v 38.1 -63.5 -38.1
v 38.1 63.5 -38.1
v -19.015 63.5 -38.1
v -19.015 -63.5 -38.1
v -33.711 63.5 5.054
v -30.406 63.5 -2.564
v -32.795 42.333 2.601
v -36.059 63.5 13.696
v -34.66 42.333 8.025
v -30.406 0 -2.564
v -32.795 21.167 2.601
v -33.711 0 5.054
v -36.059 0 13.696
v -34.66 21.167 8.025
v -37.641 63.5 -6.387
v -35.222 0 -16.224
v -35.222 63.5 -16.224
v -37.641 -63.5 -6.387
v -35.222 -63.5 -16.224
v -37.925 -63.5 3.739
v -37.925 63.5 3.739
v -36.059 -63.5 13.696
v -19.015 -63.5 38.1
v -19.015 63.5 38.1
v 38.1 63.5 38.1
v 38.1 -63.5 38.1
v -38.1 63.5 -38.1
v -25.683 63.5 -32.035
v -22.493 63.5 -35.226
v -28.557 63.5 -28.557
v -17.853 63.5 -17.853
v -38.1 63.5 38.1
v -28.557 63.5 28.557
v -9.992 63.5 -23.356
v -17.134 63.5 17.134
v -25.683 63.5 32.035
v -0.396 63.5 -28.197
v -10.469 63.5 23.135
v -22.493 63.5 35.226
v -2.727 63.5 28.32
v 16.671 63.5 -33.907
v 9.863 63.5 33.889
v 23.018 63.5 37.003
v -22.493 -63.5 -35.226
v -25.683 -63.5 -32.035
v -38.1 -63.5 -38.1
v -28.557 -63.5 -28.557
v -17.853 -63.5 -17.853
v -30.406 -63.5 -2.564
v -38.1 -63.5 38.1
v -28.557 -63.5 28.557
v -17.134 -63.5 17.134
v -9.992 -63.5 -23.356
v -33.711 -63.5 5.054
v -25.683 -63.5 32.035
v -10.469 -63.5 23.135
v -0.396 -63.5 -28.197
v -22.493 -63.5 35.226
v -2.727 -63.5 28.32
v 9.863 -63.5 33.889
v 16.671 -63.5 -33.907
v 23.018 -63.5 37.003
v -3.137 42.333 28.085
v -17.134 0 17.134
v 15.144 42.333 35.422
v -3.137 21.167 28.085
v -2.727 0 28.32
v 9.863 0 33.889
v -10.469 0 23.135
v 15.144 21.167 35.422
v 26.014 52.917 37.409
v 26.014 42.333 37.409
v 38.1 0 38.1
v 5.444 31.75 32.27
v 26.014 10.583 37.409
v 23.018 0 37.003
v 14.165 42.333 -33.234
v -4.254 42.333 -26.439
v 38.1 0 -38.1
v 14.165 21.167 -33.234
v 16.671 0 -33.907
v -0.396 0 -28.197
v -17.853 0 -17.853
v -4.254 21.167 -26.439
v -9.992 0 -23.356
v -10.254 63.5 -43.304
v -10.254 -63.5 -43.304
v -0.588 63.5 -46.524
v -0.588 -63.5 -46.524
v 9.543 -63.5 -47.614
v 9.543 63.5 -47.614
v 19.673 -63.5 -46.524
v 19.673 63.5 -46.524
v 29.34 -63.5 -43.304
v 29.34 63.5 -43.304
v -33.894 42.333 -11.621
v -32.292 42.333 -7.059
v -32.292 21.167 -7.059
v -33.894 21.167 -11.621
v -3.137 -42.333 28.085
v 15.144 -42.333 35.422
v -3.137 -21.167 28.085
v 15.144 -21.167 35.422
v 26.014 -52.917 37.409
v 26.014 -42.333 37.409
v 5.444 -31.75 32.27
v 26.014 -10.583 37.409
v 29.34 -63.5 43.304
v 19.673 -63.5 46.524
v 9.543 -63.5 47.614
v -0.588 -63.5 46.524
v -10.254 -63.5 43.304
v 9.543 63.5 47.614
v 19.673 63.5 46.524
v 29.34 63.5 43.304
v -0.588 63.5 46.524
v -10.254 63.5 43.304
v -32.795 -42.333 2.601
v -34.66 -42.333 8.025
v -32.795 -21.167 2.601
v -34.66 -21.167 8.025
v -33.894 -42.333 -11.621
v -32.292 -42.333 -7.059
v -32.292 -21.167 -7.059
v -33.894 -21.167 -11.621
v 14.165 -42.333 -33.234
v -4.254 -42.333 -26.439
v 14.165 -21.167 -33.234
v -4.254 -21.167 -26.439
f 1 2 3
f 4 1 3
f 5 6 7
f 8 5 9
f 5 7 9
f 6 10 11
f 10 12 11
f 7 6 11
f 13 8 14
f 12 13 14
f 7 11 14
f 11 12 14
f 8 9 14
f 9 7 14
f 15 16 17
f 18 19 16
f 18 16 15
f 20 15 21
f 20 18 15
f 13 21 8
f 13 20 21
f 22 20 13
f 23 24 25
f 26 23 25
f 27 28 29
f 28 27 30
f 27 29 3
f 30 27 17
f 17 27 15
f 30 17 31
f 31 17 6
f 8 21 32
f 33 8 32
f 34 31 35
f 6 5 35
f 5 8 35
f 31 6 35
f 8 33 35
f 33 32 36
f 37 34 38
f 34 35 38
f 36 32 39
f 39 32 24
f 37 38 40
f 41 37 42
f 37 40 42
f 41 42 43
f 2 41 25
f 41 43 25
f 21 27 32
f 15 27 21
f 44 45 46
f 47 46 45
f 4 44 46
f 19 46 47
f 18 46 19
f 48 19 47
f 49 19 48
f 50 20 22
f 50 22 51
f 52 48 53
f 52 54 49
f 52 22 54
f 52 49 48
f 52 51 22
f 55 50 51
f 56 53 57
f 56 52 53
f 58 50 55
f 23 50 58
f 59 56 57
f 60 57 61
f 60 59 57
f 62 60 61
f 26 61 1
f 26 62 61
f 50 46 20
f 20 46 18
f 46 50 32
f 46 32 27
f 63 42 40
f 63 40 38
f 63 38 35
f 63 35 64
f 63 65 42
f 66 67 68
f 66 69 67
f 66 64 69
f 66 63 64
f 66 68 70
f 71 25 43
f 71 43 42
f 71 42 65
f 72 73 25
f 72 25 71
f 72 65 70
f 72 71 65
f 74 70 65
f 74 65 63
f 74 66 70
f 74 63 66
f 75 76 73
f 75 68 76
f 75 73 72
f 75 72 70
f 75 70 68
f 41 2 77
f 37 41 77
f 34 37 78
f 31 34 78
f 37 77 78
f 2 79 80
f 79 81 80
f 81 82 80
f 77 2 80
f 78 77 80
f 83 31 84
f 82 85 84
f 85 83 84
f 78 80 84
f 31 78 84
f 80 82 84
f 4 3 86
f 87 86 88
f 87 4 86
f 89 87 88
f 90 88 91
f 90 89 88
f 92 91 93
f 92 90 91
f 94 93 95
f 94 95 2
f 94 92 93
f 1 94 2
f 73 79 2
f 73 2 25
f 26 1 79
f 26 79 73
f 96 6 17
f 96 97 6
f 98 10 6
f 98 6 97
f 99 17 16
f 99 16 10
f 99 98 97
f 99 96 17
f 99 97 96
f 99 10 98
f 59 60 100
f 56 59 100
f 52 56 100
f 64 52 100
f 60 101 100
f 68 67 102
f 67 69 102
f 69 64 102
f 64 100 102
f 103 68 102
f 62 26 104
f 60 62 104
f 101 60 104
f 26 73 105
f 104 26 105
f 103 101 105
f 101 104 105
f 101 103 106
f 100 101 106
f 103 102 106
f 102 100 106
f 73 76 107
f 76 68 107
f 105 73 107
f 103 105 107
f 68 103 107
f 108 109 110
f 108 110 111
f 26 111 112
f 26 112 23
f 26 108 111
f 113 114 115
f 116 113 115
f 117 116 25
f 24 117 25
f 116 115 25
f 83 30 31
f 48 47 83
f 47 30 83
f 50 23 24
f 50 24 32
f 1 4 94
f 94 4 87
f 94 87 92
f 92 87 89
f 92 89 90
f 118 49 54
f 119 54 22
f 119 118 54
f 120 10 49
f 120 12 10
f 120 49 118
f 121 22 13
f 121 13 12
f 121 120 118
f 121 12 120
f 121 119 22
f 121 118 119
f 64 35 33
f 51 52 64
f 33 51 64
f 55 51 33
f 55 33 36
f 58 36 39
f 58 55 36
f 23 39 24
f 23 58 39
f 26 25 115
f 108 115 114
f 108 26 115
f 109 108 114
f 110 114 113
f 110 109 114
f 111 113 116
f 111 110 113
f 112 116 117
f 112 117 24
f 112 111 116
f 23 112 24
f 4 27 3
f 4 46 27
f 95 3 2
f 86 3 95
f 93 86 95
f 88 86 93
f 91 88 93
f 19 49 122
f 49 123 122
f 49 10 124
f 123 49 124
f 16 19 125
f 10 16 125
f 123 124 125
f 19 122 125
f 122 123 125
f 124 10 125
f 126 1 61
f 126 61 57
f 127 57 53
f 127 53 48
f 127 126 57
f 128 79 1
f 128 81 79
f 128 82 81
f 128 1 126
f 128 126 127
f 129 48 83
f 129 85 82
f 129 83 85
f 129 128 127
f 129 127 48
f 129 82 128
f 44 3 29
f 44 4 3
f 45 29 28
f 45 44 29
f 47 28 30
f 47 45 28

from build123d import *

# Parameters (mm, degrees)
F1_DEPTH = 63.5


with BuildPart() as f1:
    # F0 (on Front) → F1 (new body, symmetric)
    with BuildSketch(Plane.XZ):
        with BuildLine():
            ThreePointArc((38.1, 38.1), (9.5427310973, 47.6143634545), (-19.0145378053, 38.1))
            Line((-19.0145378053, 38.1), (38.1, 38.1))
        make_face()
    extrude(amount=F1_DEPTH, both=True)


with BuildPart() as f1b:
    # F0 (on Front) → F1, piece 2 (new body, symmetric)
    with BuildSketch(Plane.XZ):
        with BuildLine():
            Line((-19.0145378053, 38.1), (-38.1, 38.1))
            Line((-38.1, 38.1), (-28.5572689027, 28.5572689027))
            ThreePointArc((-28.5572689027, 28.5572689027), (-24.1257081832, 33.6684392806), (-19.0145378053, 38.1))
        make_face()
        with BuildLine():
            Line((-28.5572689027, 28.5572689027), (-38.1, 38.1))
            add(Edge.make_bspline(
                [(-36.0593740105, 13.6958247987), (-37.606358952, 21.2626155541), (-38.1, 29.4344872531), (-38.1, 38.1)],
                knots=[83.2533021496, 83.2533021496, 83.2533021496, 83.2533021496, 107.7630734528, 107.7630734528, 107.7630734528, 107.7630734528], degree=3))
            ThreePointArc((-36.0593740105, 13.6958247987), (-32.9628712403, 21.456965701), (-28.5572689027, 28.5572689027))
        make_face()
        with BuildLine():
            add(Edge.make_bspline(
                [(-36.0593740105, 13.6958247987), (-37.606358952, 21.2626155541), (-38.1, 29.4344872531), (-38.1, 38.1)],
                knots=[83.2533021496, 83.2533021496, 83.2533021496, 83.2533021496, 107.7630734528, 107.7630734528, 107.7630734528, 107.7630734528], degree=3))
            Line((-38.1, 38.1), (-38.1, -38.1))
            add(Edge.make_bspline(
                [(-35.2221567826, -16.2244389818), (-37.1399092957, -23.6350339686), (-38.0359895886, -31.0968665214), (-38.1, -38.1)],
                knots=[84.8979166137, 84.8979166137, 84.8979166137, 84.8979166137, 107.7630734528, 107.7630734528, 107.7630734528, 107.7630734528], degree=3))
            ThreePointArc((-35.2221567826, -16.2244389818), (-38.0530029719, -1.3318053887), (-36.0593740105, 13.6958247987))
        make_face()
        with BuildLine():
            add(Edge.make_bspline(
                [(-35.2221567826, -16.2244389818), (-37.1399092957, -23.6350339686), (-38.0359895886, -31.0968665214), (-38.1, -38.1)],
                knots=[84.8979166137, 84.8979166137, 84.8979166137, 84.8979166137, 107.7630734528, 107.7630734528, 107.7630734528, 107.7630734528], degree=3))
            Line((-38.1, -38.1), (-28.5572689027, -28.5572689027))
            ThreePointArc((-28.5572689027, -28.5572689027), (-32.346075096, -22.6374804887), (-35.2221567826, -16.2244389818))
        make_face()
        with BuildLine():
            Line((-28.5572689027, -28.5572689027), (-38.1, -38.1))
            Line((-38.1, -38.1), (-19.0145378053, -38.1))
            ThreePointArc((-19.0145378053, -38.1), (-24.1257081832, -33.6684392806), (-28.5572689027, -28.5572689027))
        make_face()
        with BuildLine():
            Line((38.1, -38.1), (38.1, 38.1))
            add(Edge.make_bspline(
                [(38.1, 38.1), (12.6778335683, 38.1), (-5.1501830309, 29.5422656203), (-17.1344151816, 17.1344151816)],
                knots=[0, 0, 0, 0, 47.9662603215, 47.9662603215, 47.9662603215, 47.9662603215], degree=3))
            Line((-17.1344151816, 17.1344151816), (0, 0))
            Line((0, 0), (-17.8533637351, -17.8533637351))
            add(Edge.make_bspline(
                [(38.1, -38.1), (11.1752385556, -34.2454202587), (-6.430822182, -27.2884642452), (-17.8533637351, -17.8533637351)],
                knots=[0, 0, 0, 0, 43.5285617457, 43.5285617457, 43.5285617457, 43.5285617457], degree=3))
        make_face()
        with BuildLine():
            Line((-17.1344151816, 17.1344151816), (-28.5572689027, 28.5572689027))
            ThreePointArc((-28.5572689027, 28.5572689027), (-32.9628712403, 21.456965701), (-36.0593740105, 13.6958247987))
            add(Edge.make_bspline(
                [(-30.4057033655, -2.5642181738), (-33.0744992193, 2.4680800067), (-34.8754227559, 7.9047461869), (-36.0593740105, 13.6958247987)],
                knots=[64.4952821435, 64.4952821435, 64.4952821435, 64.4952821435, 83.2533021496, 83.2533021496, 83.2533021496, 83.2533021496], degree=3))
            add(Edge.make_bspline(
                [(-17.1344151816, 17.1344151816), (-22.8045349243, 11.2638682118), (-27.1665026272, 4.5314589985), (-30.4057033655, -2.5642181738)],
                knots=[47.9662603215, 47.9662603215, 47.9662603215, 47.9662603215, 70.6606170574, 70.6606170574, 70.6606170574, 70.6606170574], degree=3))
        make_face()
        with BuildLine():
            ThreePointArc((-35.2221567826, -16.2244389818), (-32.346075096, -22.6374804887), (-28.5572689027, -28.5572689027))
            Line((-28.5572689027, -28.5572689027), (-17.8533637351, -17.8533637351))
            add(Edge.make_bspline(
                [(-17.8533637351, -17.8533637351), (-23.3553427892, -13.3086899305), (-27.4226648333, -8.1890543173), (-30.4057033655, -2.5642181738)],
                knots=[43.5285617457, 43.5285617457, 43.5285617457, 43.5285617457, 64.4952821435, 64.4952821435, 64.4952821435, 64.4952821435], degree=3))
            add(Edge.make_bspline(
                [(-30.4057033655, -2.5642181738), (-32.4378152148, -7.0156896402), (-34.0280422093, -11.6101316556), (-35.2221567826, -16.2244389818)],
                knots=[70.6606170574, 70.6606170574, 70.6606170574, 70.6606170574, 84.8979166137, 84.8979166137, 84.8979166137, 84.8979166137], degree=3))
        make_face()
        with BuildLine():
            Line((0, 0), (-17.1344151816, 17.1344151816))
            add(Edge.make_bspline(
                [(-17.1344151816, 17.1344151816), (-22.8045349243, 11.2638682118), (-27.1665026272, 4.5314589985), (-30.4057033655, -2.5642181738)],
                knots=[47.9662603215, 47.9662603215, 47.9662603215, 47.9662603215, 70.6606170574, 70.6606170574, 70.6606170574, 70.6606170574], degree=3))
            add(Edge.make_bspline(
                [(-17.8533637351, -17.8533637351), (-23.3553427892, -13.3086899305), (-27.4226648333, -8.1890543173), (-30.4057033655, -2.5642181738)],
                knots=[43.5285617457, 43.5285617457, 43.5285617457, 43.5285617457, 64.4952821435, 64.4952821435, 64.4952821435, 64.4952821435], degree=3))
            Line((-17.8533637351, -17.8533637351), (0, 0))
        make_face()
    extrude(amount=F1_DEPTH, both=True)


with BuildPart() as f1c:
    # F0 (on Front) → F1, piece 3 (new body, symmetric)
    with BuildSketch(Plane.XZ):
        with BuildLine():
            Line((38.1, -38.1), (-19.0145378053, -38.1))
            ThreePointArc((-19.0145378053, -38.1), (9.5427310973, -47.6143634545), (38.1, -38.1))
        make_face()
    extrude(amount=F1_DEPTH, both=True)


solid = Compound([f1.part, f1b.part, f1c.part])
